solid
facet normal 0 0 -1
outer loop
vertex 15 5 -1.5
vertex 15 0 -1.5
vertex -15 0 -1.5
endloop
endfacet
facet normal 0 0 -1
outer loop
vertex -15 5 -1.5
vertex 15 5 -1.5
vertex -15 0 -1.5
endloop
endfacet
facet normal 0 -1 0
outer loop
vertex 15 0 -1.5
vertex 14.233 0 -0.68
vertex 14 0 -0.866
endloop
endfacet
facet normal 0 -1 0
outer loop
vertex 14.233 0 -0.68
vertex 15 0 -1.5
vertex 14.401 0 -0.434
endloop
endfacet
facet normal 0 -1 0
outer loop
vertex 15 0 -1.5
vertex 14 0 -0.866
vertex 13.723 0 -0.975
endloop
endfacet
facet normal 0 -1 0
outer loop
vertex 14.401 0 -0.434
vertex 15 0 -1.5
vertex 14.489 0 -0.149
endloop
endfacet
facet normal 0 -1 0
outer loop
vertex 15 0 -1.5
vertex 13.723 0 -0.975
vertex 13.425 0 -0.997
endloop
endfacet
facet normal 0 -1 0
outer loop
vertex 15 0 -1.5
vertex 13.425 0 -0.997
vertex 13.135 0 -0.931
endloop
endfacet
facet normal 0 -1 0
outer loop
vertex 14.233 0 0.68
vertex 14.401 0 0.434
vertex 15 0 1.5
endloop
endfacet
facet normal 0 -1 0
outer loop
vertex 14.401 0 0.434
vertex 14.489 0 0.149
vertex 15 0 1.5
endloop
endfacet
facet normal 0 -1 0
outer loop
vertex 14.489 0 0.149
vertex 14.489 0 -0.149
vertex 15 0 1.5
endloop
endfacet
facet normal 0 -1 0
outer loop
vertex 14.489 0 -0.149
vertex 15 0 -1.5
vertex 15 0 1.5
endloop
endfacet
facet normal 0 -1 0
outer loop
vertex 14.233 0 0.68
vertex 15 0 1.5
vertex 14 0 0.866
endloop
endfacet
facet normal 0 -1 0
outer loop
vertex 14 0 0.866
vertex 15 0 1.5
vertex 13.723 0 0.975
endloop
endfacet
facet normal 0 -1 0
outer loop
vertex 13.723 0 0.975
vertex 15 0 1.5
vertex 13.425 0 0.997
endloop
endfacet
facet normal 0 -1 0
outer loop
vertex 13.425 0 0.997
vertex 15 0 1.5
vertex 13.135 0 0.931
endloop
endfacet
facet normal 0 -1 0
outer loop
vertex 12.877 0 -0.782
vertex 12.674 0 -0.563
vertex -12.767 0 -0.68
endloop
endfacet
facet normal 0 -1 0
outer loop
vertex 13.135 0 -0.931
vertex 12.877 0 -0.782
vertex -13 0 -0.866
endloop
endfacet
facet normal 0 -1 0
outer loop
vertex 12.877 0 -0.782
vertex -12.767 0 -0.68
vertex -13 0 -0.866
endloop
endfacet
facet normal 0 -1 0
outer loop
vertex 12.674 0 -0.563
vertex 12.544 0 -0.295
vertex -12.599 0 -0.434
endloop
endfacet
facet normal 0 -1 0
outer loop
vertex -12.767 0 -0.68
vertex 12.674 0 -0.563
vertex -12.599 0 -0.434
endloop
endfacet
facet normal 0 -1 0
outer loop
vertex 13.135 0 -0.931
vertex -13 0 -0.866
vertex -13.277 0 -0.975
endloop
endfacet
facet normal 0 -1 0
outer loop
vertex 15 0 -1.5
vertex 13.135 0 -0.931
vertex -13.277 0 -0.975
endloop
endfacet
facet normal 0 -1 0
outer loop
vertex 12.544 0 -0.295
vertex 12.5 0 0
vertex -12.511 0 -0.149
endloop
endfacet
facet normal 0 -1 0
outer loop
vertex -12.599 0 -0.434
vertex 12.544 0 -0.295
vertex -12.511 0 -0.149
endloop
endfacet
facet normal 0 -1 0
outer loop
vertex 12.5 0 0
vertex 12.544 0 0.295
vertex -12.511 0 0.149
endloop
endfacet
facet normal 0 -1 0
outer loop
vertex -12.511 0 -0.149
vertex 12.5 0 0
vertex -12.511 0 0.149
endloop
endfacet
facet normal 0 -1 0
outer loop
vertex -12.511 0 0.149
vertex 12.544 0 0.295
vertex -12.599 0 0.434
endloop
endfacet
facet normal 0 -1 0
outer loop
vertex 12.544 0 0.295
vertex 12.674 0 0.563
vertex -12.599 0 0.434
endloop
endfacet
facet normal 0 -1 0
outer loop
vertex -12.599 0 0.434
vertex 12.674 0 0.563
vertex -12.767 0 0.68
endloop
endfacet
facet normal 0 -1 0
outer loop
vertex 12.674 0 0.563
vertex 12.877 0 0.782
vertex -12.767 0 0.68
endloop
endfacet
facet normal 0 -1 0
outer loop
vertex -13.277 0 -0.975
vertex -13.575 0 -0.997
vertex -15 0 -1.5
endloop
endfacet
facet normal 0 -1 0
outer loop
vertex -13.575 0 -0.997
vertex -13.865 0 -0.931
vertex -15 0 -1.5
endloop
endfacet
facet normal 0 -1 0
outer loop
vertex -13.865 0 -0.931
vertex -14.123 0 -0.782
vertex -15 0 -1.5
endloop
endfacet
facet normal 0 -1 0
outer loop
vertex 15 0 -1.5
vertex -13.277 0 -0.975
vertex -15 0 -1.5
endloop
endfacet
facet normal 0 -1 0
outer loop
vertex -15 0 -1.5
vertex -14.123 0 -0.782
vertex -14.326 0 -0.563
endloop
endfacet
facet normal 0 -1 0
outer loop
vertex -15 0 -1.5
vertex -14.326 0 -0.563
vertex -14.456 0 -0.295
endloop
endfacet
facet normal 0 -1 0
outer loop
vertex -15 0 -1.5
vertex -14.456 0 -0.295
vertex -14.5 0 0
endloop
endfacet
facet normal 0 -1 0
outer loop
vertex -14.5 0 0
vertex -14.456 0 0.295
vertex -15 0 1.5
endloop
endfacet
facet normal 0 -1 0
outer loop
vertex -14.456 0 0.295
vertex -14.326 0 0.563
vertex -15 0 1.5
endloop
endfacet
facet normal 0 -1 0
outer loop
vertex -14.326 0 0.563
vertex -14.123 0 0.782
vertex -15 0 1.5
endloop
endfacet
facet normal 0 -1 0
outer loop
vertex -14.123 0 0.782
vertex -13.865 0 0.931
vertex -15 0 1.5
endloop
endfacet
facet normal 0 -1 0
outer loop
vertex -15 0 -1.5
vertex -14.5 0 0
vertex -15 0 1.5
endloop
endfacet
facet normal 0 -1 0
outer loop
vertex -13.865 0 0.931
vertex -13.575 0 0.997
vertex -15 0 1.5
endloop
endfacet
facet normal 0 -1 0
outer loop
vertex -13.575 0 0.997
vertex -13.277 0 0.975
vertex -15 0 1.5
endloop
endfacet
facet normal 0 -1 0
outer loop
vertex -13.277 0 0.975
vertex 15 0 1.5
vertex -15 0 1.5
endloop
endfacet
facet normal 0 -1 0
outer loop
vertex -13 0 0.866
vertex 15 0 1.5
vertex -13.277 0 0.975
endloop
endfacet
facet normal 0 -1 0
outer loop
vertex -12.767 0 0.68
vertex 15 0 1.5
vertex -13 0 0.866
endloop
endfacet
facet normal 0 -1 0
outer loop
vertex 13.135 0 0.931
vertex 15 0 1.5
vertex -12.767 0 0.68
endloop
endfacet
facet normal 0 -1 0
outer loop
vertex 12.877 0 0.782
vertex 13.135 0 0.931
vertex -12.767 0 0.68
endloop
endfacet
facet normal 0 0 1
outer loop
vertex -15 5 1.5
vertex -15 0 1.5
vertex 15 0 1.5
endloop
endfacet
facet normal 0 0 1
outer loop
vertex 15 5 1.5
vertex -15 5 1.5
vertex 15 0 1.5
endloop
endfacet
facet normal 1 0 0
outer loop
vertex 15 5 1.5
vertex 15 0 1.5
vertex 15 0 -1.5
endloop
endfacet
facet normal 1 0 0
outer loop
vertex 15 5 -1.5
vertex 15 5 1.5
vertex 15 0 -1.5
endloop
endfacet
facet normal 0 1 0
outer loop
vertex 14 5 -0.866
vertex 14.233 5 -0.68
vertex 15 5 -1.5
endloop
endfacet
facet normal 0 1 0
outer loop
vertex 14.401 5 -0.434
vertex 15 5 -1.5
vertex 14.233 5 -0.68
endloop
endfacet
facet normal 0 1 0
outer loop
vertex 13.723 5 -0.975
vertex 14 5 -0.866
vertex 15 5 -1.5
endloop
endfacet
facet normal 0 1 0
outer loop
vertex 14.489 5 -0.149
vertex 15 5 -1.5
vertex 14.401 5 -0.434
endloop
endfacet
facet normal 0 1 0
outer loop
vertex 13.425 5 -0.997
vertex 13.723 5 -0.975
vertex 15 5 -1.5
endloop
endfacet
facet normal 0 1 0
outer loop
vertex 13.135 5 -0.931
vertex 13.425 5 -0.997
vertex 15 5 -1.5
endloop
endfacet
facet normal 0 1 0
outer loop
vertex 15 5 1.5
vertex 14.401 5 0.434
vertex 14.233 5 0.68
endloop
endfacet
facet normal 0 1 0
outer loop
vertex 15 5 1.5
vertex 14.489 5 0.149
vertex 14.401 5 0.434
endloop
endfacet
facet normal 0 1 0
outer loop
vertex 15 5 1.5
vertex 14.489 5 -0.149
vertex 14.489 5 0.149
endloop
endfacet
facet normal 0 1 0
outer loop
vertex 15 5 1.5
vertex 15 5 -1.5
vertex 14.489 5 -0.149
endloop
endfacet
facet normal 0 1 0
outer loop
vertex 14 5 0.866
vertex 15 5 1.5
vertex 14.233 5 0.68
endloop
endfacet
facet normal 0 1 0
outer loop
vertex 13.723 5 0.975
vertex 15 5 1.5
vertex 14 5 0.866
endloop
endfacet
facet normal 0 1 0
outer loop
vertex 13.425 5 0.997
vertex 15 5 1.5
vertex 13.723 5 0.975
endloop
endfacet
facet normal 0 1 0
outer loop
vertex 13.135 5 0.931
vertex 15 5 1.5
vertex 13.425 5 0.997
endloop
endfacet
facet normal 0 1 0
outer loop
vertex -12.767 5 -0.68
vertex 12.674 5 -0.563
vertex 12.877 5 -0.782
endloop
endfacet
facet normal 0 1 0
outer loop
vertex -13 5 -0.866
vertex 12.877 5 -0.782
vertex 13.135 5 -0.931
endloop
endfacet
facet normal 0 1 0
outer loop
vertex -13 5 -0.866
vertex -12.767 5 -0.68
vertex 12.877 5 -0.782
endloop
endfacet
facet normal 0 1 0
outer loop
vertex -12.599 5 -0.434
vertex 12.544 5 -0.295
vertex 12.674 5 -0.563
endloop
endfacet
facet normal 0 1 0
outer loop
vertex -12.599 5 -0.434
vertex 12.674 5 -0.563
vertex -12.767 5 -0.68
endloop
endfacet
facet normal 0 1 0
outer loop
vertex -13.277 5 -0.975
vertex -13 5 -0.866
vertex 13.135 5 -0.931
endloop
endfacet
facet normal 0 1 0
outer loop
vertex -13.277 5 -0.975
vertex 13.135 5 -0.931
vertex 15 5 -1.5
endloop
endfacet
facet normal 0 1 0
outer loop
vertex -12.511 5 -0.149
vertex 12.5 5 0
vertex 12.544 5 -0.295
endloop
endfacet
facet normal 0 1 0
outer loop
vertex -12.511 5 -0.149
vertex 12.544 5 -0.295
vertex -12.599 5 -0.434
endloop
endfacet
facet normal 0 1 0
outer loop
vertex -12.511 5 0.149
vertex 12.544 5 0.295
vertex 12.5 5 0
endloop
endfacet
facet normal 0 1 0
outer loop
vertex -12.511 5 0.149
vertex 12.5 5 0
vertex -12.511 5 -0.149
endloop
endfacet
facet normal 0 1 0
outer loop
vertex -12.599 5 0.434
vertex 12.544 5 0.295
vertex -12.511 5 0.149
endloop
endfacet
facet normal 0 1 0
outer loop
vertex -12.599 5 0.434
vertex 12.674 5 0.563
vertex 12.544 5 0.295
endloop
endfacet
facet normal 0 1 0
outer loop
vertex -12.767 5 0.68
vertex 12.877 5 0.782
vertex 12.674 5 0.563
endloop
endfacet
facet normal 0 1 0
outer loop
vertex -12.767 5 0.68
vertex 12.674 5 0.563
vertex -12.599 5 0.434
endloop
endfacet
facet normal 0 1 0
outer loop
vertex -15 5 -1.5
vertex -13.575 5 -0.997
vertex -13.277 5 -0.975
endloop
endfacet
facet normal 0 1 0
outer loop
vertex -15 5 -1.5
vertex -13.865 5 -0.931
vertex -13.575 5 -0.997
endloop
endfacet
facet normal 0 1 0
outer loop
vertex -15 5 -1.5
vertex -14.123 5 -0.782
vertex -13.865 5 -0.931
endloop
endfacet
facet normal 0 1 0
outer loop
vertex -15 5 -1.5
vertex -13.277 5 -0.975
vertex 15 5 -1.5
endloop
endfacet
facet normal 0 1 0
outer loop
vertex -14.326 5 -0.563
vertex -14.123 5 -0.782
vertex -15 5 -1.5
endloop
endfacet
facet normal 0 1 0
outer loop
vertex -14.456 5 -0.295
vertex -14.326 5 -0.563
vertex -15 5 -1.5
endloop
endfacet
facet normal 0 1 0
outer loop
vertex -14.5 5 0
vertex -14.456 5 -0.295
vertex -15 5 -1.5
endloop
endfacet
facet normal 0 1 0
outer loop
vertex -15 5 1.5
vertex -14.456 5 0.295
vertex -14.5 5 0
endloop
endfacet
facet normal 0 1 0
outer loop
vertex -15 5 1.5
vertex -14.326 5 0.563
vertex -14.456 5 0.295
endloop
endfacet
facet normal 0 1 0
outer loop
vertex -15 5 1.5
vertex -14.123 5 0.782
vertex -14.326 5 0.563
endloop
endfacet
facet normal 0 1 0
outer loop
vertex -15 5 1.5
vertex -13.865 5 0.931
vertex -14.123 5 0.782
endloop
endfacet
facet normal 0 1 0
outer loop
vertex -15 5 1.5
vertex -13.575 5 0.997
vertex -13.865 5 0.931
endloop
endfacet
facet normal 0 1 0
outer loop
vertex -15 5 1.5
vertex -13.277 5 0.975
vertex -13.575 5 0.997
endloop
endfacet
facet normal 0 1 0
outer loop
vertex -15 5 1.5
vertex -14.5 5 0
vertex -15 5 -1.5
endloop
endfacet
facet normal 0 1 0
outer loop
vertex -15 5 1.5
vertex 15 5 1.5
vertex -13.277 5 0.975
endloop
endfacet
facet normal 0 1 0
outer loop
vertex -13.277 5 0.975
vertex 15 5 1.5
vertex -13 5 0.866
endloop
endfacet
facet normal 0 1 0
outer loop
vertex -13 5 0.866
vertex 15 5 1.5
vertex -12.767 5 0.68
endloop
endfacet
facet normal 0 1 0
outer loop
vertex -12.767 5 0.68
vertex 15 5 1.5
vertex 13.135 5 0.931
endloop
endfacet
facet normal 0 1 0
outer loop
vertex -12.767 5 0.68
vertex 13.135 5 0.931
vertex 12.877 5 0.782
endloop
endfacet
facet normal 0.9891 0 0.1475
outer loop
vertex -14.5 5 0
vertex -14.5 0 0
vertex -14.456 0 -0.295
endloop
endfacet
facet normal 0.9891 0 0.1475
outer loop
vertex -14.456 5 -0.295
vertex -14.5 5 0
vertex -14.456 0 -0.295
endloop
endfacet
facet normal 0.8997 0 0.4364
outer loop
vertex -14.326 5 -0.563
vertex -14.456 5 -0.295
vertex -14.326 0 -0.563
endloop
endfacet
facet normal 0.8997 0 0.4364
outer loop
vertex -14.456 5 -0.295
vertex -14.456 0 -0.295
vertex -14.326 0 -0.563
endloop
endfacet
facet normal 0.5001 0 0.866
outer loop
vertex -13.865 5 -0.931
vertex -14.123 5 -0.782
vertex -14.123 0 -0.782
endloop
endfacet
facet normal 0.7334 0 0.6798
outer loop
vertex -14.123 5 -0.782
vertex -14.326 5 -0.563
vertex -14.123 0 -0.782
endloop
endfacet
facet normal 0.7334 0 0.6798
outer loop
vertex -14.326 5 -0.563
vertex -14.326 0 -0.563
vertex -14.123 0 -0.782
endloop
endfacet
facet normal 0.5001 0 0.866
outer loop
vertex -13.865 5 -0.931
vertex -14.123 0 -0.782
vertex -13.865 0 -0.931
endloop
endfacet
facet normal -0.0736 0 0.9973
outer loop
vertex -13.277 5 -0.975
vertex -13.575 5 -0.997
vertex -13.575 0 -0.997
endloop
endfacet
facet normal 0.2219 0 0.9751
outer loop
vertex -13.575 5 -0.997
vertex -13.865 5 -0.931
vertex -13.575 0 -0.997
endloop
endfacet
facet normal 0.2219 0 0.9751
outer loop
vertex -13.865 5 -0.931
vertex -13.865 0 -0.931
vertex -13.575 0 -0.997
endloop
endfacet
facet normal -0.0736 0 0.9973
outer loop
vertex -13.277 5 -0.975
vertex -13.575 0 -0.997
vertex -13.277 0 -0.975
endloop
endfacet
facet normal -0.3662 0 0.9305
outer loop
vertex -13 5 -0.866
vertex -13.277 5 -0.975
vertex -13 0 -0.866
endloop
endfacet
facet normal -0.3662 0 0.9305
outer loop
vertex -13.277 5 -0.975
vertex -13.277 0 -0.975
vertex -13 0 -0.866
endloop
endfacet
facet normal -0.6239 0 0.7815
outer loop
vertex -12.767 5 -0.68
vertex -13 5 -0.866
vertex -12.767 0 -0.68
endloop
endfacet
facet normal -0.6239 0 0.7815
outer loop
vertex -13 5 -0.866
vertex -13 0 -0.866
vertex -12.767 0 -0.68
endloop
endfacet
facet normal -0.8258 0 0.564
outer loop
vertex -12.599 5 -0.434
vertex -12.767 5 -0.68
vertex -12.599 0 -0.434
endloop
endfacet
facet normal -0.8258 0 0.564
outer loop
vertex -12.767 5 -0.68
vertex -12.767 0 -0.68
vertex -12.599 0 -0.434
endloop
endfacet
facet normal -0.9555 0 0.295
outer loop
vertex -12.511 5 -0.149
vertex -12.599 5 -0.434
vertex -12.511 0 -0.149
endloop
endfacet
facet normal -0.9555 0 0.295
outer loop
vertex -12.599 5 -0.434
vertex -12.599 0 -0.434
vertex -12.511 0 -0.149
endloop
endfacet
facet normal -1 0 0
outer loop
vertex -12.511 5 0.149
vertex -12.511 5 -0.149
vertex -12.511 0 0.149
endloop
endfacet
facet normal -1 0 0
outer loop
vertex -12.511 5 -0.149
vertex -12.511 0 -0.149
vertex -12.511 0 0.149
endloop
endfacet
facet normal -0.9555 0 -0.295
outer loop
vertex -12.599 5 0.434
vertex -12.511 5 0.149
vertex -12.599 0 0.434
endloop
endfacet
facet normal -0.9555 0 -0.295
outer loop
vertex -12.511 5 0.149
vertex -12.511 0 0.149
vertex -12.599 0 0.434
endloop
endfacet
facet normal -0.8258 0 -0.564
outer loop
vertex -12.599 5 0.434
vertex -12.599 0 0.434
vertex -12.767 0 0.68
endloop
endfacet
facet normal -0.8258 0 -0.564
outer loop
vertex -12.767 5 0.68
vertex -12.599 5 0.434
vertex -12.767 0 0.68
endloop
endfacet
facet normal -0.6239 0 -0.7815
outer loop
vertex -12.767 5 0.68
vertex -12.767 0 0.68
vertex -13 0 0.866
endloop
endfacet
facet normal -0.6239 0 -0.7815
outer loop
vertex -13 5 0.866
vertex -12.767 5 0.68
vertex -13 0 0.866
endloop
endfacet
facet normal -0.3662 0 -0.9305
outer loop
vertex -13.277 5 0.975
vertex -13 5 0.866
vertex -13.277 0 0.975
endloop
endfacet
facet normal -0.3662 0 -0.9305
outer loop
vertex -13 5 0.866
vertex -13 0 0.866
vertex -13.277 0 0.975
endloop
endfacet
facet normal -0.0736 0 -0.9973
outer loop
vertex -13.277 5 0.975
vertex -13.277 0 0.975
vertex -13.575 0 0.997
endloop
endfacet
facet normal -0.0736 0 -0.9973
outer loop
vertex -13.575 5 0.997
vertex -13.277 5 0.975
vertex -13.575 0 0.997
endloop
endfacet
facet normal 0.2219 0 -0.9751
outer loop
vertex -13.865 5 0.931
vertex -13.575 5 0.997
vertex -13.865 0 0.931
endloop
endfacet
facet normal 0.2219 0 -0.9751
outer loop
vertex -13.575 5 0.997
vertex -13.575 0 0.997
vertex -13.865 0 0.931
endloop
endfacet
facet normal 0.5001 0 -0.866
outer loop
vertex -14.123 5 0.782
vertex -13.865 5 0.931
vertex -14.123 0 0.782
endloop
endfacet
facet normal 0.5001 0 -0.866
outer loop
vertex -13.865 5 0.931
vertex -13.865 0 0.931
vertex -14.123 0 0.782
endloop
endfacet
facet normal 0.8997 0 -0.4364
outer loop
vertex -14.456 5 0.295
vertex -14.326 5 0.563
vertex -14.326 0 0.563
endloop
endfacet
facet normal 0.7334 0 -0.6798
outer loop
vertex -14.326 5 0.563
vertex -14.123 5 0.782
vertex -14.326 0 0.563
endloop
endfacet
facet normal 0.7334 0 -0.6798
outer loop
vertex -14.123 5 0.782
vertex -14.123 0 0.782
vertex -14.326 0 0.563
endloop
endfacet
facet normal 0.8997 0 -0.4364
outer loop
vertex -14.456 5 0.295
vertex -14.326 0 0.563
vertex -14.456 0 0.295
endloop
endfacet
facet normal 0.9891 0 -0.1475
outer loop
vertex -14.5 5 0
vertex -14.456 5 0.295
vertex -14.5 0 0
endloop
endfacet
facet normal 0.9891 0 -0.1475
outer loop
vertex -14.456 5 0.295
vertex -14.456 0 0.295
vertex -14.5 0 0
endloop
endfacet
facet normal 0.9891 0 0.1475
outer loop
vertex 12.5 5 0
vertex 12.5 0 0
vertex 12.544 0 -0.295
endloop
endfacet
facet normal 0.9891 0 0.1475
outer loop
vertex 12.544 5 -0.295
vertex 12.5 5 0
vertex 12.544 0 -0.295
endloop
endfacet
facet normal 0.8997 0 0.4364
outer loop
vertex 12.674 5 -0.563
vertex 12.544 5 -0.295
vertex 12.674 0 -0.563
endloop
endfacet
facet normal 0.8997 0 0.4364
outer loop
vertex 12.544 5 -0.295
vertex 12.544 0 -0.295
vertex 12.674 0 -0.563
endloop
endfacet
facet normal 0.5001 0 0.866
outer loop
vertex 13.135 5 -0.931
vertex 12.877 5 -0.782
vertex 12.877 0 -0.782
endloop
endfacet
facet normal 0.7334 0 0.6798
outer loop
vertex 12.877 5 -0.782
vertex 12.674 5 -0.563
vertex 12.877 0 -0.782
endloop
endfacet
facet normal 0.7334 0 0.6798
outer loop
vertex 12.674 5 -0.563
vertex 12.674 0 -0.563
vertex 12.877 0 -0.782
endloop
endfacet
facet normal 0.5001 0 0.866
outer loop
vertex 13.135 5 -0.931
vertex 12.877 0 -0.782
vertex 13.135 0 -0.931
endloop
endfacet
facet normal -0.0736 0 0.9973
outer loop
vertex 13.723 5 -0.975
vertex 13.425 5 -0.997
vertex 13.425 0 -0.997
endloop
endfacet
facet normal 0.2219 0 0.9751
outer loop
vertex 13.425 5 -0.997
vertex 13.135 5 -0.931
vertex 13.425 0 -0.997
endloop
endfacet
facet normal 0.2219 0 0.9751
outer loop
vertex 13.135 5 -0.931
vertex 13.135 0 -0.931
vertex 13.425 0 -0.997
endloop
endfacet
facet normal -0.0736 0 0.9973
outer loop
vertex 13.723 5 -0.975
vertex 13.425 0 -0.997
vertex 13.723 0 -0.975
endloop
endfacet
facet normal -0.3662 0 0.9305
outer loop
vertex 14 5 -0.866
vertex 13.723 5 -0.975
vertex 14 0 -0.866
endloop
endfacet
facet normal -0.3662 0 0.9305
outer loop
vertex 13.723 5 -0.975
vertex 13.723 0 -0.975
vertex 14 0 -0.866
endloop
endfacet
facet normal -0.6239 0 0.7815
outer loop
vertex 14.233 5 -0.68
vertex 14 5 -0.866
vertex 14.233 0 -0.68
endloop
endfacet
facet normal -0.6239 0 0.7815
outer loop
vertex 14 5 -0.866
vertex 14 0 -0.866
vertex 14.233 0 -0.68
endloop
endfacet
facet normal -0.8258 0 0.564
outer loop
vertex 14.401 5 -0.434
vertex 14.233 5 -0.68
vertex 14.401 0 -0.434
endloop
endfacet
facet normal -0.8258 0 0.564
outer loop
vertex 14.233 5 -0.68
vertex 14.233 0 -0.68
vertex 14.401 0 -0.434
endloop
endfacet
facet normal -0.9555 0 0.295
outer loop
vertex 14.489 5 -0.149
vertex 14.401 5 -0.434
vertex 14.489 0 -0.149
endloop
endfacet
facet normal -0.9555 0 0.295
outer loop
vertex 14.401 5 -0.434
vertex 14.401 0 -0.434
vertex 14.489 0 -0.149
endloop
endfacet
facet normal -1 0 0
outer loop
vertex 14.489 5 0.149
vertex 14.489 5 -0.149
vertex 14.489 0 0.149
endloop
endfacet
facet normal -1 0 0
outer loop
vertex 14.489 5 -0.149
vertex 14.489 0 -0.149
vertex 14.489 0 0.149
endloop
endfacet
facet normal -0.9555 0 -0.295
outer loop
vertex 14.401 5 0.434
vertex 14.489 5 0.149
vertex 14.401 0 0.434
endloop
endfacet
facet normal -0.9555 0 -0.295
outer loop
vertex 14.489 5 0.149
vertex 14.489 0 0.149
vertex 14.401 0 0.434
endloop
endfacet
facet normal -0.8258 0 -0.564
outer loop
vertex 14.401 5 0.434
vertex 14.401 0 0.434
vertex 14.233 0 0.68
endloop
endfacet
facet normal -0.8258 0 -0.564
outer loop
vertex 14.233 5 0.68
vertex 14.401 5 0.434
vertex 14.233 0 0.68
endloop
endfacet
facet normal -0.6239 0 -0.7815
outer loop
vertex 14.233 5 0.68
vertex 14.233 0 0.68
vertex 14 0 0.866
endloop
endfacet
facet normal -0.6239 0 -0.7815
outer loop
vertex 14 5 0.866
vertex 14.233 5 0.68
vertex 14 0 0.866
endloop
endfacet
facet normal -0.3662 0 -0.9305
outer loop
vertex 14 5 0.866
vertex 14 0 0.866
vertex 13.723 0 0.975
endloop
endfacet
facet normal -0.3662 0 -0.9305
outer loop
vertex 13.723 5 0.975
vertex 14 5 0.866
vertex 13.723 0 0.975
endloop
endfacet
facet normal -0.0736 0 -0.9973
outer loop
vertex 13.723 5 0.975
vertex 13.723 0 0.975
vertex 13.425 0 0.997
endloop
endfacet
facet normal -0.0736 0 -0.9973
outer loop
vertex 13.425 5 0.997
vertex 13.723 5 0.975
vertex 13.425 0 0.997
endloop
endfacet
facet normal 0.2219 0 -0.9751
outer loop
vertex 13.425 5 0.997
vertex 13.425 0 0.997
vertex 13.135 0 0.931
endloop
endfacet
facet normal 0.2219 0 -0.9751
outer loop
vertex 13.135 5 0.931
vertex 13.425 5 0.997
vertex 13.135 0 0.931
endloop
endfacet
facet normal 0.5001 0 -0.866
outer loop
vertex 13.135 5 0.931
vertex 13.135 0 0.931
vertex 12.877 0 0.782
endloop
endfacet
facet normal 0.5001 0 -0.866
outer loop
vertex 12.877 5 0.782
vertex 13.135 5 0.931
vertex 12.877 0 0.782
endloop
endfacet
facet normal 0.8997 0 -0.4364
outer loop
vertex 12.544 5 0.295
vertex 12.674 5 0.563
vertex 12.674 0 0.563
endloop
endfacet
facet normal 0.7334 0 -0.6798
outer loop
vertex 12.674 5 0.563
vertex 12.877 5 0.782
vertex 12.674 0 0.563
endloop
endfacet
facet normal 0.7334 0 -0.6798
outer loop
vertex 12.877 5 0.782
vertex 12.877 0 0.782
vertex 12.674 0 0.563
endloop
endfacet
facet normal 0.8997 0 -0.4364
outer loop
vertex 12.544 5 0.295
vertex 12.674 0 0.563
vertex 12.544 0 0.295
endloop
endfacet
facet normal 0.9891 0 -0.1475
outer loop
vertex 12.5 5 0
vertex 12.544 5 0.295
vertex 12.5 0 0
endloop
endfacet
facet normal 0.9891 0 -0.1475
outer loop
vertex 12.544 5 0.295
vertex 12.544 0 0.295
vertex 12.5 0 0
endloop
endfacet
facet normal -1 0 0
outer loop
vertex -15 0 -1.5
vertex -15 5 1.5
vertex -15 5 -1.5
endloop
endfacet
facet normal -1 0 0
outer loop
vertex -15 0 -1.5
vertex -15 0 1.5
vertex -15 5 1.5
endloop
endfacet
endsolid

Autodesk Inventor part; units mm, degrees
ref_plane "YZ Plane" through (0, 0, 0) normal (1, 0, 0) x (0, 1, 0)
ref_plane "XZ Plane" through (0, 0, 0) normal (0, 1, 0) x (-1, 0, 0)
ref_plane "XY Plane" through (0, 0, 0) normal (0, 0, 1) x (1, 0, 0)
sketch "Sketch1" plane through (0, 0, 0) normal (0, 1, 0) x (-1, 0, 0)
  line L0 (-15, -1.5) -> (15, -1.5)
  line L1 (15, 3.5) -> (15, 3.5)
  line L2 (15, 1.5) -> (-15, 1.5)
  line L3 (-15, 3.5) -> (-15, 3.5)
  line L4 (-15, -1.5) -> (15, 1.5) construction
  line L5 (15, -1.5) -> (-15, 1.5) construction
  circle A0 centre (13.5, 0) radius 1
  line L6 (-15, 1.5) -> (-15, -1.5)
  line L7 (15, 1.5) -> (15, -1.5)
  circle A1 centre (-13.5, 0) radius 1
  point P0 (0, 0)
  dimension "d0" = 3
  dimension "d1" = 30
  dimension "d3" = 2
  dimension "d6" = 1.5
  dimension "d8" = 1.5
  dimension "d13" = 2
  dimension "d14" = 1.5
  dimension "d15" = 1.5
extrude "Extrusion1" add sketch "Sketch1" along normal blind 5
properties part number "link"
